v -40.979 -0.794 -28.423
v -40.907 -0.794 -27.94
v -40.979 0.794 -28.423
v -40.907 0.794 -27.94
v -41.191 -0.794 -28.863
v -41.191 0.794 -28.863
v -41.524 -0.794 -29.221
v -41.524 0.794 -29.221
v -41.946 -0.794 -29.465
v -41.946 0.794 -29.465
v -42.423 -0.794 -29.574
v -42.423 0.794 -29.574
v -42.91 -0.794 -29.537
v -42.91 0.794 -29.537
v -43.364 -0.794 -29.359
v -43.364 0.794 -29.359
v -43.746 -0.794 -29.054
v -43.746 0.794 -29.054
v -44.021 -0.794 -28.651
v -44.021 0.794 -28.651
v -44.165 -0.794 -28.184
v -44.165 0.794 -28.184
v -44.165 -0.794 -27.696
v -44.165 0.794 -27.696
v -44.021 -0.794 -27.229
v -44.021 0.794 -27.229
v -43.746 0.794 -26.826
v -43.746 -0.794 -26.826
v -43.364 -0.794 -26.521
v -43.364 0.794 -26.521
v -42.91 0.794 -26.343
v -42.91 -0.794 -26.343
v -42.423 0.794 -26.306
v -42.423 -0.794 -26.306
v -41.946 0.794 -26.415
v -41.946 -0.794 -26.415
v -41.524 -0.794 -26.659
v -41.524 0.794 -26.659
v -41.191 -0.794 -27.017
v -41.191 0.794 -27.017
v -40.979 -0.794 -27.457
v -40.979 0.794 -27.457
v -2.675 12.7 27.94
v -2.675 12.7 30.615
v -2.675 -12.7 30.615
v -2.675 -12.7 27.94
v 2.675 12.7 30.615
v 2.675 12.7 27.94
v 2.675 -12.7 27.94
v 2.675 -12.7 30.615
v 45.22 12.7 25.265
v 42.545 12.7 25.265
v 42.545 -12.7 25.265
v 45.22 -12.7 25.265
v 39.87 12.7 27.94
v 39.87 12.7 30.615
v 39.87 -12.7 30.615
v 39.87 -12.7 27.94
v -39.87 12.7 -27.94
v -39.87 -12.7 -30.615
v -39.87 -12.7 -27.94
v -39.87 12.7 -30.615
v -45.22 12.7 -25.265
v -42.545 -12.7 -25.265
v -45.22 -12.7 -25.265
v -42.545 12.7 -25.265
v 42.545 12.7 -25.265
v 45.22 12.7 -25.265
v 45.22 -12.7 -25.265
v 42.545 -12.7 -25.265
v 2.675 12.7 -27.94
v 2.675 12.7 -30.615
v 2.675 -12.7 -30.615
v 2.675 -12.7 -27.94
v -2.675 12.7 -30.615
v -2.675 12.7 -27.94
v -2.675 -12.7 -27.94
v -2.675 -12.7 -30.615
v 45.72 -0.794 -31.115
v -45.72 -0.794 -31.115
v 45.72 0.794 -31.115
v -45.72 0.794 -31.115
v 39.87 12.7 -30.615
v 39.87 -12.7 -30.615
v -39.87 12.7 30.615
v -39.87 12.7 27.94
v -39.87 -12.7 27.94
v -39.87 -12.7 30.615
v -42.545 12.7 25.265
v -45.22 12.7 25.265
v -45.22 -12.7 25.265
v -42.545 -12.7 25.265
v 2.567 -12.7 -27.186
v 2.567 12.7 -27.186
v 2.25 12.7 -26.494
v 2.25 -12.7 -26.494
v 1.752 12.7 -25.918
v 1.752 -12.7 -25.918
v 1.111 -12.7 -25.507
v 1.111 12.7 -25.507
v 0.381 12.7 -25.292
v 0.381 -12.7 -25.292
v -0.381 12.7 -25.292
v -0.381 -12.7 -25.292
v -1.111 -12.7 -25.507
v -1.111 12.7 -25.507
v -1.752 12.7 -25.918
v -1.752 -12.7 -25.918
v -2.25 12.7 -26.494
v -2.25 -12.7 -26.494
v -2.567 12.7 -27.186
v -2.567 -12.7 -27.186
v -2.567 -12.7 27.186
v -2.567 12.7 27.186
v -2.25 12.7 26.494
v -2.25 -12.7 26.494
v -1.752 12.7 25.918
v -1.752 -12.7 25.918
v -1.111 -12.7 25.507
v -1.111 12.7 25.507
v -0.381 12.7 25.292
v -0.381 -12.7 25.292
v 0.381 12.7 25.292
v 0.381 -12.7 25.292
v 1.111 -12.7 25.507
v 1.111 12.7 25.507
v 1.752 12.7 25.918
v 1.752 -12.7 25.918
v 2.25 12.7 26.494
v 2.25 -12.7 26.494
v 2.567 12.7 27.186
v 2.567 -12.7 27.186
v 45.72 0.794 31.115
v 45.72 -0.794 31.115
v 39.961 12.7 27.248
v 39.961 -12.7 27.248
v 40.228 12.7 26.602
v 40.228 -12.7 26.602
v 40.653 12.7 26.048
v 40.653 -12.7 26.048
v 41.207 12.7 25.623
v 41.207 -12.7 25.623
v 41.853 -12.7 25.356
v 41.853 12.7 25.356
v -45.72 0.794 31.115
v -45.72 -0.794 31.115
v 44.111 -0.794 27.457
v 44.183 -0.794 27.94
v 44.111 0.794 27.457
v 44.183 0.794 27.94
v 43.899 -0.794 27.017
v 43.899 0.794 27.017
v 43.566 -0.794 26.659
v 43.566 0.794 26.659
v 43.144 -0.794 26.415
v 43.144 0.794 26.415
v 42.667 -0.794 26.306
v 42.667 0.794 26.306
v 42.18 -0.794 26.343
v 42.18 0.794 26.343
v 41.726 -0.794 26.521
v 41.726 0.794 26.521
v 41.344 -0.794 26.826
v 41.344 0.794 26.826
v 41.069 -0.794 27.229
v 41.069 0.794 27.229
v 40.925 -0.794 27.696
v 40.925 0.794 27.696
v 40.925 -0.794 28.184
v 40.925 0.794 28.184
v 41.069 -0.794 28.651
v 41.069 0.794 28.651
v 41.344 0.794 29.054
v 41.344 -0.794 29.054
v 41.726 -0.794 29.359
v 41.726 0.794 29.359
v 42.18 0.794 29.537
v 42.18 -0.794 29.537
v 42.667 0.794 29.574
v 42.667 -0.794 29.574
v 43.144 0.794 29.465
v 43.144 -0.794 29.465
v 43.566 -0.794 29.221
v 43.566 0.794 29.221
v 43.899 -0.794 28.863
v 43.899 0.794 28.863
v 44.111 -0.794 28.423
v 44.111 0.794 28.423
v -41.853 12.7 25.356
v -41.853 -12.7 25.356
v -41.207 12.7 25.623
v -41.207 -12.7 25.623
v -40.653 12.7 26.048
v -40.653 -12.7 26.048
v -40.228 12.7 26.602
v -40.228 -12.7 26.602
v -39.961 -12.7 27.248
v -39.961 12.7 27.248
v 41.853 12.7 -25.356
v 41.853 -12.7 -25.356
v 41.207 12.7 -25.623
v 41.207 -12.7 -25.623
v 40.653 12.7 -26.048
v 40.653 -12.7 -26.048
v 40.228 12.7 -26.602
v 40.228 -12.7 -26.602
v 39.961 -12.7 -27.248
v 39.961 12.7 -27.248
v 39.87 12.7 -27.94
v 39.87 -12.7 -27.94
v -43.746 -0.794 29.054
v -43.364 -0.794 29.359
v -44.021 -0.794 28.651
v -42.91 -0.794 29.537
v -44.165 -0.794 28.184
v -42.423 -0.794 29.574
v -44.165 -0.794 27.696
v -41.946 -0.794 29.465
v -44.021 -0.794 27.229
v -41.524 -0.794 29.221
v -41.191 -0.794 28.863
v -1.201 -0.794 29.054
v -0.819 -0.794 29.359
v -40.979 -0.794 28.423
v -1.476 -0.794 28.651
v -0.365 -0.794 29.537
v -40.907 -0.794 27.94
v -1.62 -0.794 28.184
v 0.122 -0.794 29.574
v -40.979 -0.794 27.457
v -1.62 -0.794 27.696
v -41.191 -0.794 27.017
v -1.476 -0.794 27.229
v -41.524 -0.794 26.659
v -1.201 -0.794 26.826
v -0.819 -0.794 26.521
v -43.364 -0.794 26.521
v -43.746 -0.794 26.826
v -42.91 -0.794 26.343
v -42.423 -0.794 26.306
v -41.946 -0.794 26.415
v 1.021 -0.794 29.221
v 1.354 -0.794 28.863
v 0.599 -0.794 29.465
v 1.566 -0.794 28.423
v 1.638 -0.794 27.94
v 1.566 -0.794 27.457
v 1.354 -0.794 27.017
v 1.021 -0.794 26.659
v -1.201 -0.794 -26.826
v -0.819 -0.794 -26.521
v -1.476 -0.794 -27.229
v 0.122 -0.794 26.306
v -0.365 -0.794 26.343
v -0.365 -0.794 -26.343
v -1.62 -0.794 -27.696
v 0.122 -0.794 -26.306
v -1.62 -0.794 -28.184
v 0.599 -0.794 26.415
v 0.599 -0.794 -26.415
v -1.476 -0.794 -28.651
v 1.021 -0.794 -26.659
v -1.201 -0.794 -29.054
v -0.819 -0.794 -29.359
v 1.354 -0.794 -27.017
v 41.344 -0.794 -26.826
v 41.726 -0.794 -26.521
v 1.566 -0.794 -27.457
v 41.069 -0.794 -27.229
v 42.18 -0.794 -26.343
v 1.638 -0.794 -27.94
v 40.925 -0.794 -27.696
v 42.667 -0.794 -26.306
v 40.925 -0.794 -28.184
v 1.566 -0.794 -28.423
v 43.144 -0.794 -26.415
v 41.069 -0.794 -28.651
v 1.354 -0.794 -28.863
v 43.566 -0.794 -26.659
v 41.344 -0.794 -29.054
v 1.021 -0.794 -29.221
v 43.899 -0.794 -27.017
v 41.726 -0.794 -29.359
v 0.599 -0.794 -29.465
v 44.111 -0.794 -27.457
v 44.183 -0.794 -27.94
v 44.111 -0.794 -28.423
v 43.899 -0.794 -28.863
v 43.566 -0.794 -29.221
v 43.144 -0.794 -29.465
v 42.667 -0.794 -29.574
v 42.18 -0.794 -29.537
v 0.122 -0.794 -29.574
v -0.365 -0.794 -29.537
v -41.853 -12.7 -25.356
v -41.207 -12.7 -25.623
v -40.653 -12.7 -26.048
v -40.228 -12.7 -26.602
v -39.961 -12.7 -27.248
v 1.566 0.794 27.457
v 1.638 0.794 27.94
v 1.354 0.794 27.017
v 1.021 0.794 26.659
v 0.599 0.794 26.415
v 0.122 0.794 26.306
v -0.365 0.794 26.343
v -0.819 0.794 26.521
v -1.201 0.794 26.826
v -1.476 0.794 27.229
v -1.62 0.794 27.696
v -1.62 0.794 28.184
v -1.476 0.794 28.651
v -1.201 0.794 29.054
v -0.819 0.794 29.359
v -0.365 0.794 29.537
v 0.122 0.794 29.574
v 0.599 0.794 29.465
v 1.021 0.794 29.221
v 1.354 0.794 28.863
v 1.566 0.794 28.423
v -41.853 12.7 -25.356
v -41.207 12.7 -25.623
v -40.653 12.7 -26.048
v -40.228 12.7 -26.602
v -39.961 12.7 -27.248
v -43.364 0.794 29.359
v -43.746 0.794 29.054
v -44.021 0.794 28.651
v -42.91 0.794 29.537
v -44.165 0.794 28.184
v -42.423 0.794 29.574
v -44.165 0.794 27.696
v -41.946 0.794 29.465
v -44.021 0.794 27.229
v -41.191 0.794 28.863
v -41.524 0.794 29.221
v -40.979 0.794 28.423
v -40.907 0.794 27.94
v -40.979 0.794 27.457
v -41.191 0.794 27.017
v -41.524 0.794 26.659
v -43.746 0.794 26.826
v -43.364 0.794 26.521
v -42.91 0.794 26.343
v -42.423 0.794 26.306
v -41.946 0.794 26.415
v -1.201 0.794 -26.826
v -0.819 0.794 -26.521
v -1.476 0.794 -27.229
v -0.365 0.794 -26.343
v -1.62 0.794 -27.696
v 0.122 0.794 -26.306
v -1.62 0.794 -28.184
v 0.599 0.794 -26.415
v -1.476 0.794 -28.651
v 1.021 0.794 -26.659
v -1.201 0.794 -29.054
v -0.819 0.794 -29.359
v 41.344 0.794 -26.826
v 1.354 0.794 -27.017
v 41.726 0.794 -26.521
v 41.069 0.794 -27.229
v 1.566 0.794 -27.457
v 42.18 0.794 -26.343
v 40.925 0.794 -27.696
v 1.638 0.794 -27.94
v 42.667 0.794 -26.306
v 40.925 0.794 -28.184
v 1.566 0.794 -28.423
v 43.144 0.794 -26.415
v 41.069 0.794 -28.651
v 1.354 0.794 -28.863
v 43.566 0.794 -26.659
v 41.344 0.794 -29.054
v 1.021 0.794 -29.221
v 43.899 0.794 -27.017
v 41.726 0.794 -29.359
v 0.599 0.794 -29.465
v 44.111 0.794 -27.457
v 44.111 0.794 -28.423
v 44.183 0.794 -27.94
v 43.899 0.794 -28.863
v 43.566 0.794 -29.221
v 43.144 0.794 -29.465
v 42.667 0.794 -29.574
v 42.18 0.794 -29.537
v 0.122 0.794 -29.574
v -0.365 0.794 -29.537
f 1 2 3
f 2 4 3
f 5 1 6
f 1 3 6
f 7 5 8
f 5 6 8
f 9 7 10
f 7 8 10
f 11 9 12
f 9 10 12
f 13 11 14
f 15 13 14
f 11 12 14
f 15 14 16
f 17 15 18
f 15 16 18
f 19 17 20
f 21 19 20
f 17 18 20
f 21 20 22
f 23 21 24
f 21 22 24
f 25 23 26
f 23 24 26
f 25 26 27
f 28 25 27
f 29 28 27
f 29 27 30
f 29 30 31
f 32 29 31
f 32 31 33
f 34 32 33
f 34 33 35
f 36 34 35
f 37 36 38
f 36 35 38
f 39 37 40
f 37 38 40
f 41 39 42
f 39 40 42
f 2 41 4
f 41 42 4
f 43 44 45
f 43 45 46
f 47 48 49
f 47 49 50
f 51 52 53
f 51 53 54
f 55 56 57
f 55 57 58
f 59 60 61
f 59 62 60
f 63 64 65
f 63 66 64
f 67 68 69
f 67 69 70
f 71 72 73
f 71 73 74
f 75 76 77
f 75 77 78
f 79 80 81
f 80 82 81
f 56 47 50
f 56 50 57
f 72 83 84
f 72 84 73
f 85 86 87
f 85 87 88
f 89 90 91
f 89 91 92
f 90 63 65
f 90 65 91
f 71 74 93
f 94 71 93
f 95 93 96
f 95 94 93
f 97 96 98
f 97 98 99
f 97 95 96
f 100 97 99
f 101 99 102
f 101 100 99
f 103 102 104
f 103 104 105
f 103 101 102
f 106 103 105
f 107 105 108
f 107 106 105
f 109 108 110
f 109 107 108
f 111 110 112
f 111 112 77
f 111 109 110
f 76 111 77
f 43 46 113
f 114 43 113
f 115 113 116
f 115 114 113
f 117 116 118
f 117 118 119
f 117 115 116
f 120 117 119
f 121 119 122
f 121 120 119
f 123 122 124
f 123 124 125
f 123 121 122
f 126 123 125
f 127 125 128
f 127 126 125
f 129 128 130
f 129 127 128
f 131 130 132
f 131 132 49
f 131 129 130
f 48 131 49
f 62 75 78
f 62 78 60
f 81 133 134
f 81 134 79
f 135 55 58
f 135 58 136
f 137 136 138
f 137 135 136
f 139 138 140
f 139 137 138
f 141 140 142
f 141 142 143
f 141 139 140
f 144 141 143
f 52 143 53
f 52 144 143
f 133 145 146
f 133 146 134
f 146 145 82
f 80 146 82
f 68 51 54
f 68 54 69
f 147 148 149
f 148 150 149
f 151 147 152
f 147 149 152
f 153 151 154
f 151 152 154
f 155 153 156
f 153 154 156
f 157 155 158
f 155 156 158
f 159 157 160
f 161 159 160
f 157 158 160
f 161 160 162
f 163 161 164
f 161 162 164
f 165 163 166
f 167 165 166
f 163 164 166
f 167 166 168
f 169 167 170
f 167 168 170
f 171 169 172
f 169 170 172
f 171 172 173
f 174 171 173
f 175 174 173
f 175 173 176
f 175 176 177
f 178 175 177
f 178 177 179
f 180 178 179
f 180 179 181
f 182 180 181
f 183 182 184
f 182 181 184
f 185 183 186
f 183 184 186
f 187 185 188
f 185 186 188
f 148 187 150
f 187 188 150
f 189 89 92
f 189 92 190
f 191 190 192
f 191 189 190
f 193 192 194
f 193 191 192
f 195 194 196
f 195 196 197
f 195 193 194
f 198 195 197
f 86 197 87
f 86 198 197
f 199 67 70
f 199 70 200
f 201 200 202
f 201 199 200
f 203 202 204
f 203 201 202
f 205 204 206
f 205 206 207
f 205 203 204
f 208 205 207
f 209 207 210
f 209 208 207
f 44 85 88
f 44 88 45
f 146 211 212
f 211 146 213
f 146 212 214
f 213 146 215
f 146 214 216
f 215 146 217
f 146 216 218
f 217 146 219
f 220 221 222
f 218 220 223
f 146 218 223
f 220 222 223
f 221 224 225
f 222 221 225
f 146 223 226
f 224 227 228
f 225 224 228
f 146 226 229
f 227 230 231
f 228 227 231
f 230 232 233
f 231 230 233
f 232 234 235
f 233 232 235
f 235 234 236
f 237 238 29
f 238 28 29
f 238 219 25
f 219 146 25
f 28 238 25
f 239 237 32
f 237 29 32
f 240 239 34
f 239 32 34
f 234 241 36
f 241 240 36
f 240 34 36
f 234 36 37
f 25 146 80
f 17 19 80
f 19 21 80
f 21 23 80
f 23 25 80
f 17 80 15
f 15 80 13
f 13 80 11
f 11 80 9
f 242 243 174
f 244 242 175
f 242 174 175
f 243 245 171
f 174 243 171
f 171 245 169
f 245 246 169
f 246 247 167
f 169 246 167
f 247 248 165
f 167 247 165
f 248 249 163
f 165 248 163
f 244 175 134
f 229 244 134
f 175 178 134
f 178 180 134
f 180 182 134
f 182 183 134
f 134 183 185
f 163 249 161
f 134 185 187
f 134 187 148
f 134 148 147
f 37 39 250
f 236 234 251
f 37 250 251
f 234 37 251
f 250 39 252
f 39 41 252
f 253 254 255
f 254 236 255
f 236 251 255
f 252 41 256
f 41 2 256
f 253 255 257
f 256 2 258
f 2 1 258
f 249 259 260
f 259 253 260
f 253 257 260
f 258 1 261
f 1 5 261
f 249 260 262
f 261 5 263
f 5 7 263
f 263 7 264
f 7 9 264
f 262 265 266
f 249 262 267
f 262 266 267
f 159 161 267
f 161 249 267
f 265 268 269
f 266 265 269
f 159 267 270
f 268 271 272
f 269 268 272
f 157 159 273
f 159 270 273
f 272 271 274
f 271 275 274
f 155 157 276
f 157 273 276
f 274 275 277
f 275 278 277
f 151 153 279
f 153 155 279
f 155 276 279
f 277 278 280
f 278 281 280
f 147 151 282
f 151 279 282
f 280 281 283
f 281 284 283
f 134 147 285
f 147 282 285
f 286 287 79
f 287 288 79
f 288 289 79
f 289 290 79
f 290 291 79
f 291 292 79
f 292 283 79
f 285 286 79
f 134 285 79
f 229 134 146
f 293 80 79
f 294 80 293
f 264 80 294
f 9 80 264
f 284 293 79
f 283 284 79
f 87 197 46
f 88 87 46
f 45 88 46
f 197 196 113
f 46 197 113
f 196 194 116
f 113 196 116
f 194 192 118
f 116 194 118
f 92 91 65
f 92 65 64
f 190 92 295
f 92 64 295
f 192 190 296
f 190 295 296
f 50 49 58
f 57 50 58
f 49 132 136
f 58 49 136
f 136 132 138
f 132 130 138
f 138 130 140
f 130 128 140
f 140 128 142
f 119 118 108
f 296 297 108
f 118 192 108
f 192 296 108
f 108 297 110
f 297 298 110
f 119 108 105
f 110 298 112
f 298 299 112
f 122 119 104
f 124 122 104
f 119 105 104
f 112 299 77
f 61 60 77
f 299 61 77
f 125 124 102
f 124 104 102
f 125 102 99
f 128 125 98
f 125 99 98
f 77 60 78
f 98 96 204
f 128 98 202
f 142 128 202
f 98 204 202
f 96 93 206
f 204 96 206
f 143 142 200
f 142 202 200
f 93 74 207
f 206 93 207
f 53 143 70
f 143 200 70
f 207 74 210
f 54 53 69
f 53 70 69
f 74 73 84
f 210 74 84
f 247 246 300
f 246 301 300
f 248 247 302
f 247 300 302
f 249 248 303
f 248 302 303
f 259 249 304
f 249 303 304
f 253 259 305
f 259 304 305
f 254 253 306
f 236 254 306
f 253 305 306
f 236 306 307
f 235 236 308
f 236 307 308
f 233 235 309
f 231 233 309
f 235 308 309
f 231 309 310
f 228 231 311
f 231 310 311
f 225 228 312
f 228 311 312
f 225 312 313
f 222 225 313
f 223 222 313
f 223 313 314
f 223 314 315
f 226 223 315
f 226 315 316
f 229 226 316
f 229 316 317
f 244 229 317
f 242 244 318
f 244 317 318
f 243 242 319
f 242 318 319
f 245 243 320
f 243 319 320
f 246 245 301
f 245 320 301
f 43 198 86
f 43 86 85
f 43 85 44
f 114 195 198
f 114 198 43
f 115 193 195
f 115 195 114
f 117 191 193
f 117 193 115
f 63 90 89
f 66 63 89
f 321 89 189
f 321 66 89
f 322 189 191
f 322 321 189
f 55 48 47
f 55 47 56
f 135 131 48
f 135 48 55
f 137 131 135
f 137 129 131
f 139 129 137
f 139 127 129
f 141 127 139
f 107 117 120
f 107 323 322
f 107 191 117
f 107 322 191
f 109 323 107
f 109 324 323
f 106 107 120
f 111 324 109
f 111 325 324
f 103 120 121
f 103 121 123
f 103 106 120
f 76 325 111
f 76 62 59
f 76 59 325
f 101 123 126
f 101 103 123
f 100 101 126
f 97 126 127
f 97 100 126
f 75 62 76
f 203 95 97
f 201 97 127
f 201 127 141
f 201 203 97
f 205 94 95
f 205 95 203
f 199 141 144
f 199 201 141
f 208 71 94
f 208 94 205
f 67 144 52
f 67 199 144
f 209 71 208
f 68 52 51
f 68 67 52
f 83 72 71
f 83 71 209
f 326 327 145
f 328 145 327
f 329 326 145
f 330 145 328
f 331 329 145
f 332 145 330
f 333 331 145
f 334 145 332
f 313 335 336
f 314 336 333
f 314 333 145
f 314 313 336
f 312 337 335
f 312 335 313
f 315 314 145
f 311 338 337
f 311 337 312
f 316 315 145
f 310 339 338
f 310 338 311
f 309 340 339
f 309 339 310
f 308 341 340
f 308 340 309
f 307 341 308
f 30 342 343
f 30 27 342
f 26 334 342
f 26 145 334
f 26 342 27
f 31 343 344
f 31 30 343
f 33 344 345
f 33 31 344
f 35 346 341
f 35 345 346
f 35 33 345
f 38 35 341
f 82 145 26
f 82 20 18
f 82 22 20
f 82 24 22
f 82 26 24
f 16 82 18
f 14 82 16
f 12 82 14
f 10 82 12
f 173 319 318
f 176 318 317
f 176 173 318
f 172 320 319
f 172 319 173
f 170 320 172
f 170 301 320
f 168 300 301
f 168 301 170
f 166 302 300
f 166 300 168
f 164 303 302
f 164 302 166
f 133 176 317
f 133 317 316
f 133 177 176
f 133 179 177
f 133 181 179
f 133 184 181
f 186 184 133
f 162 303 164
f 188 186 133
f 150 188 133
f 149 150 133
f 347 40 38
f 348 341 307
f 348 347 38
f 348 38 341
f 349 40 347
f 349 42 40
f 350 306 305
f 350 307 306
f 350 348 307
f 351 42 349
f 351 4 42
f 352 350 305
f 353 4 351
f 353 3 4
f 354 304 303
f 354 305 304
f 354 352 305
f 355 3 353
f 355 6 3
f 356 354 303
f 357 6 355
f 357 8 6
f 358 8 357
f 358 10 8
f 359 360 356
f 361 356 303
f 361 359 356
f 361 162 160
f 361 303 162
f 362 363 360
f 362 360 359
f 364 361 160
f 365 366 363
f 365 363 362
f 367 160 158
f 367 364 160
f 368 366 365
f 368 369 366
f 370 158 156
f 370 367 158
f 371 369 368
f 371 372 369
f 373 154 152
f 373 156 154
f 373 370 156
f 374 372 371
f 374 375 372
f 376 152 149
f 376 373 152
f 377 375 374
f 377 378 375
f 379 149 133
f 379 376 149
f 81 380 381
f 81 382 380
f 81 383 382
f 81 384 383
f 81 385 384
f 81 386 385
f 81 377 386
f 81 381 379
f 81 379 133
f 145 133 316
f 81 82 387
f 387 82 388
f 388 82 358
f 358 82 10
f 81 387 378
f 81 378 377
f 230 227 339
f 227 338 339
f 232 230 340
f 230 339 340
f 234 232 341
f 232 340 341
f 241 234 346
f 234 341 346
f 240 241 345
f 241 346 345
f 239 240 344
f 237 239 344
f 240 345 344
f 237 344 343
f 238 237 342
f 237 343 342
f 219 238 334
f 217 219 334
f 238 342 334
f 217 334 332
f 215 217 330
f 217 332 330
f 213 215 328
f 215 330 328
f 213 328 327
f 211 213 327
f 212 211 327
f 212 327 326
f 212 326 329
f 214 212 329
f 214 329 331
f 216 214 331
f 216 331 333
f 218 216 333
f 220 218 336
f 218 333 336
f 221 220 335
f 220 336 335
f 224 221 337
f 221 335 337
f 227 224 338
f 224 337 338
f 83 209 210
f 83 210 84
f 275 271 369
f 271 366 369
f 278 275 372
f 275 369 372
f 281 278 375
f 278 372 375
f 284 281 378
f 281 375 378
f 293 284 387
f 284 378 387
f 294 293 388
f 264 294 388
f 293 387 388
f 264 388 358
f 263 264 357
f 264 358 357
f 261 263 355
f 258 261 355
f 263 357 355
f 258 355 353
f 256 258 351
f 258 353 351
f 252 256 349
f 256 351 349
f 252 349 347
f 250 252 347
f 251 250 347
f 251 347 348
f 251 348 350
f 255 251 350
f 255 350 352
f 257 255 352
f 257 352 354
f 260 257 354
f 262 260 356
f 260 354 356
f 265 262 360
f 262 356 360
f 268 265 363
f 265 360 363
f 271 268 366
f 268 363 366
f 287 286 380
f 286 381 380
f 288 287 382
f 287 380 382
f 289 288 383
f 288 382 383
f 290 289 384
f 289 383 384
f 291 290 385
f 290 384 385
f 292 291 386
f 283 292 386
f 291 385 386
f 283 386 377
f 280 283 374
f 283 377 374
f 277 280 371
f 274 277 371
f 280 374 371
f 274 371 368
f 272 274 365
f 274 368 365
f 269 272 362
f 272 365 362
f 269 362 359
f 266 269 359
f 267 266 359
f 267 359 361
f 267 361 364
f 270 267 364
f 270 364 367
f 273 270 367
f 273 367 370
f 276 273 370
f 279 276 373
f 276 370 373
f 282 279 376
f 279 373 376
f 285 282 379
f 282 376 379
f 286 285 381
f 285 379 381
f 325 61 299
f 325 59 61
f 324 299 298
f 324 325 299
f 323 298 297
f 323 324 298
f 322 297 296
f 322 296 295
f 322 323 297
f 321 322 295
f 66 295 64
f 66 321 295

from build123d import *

# Parameters (mm, degrees)
SKETCH1_W            = 91.44
SKETCH1_H            = 62.23
BOSS_EXTRUDE1_DEPTH  = 0.79375
SKETCH3_R            = 1.6383
CUT_EXTRUDE1_DEPTH   = 1.79375
LPATTERN1_COUNT      = 3
LPATTERN1_PITCH      = 42.545
LPATTERN1_COUNT_DIR2 = 2
LPATTERN1_PITCH_DIR2 = 55.88
BOSS_EXTRUDE2_DEPTH  = 12.7


with BuildPart() as part:
    # Sketch1 → Boss-Extrude1 (new body, symmetric)
    with BuildSketch(Plane(origin=(0, 0, 0), x_dir=(1, 0, 0), z_dir=(0, 1, 0))):
        Rectangle(SKETCH1_W, SKETCH1_H)
    extrude(amount=BOSS_EXTRUDE1_DEPTH, both=True)

    # Sketch3 → Cut-Extrude1 (cut, symmetric)
    with BuildSketch(Plane(origin=(0, 0, 0), x_dir=(1, 0, 0), z_dir=(0, 1, 0))):
        with Locations((-42.545, 27.94)):
            Circle(SKETCH3_R)
    cut_extrude1 = extrude(amount=CUT_EXTRUDE1_DEPTH, both=True, mode=Mode.SUBTRACT)

    # LPattern1: Cut-Extrude1 3 × 2
    with Locations(*[(i * LPATTERN1_PITCH, 0, j * LPATTERN1_PITCH_DIR2) for i in range(LPATTERN1_COUNT) for j in range(LPATTERN1_COUNT_DIR2) if (i, j) != (0, 0)]):
        add(cut_extrude1, mode=Mode.SUBTRACT)


with BuildPart() as body_2:
    # Sketch2 → Boss-Extrude2 (new body, symmetric)
    with BuildSketch(Plane(origin=(0, 0, 0), x_dir=(1, 0, 0), z_dir=(0, 1, 0))):
        with BuildLine():
            Line((-42.545, 25.265), (-45.22, 25.265))
            Line((-45.22, 25.265), (-45.22, -25.265))
            Line((-45.22, -25.265), (-42.545, -25.265))
            ThreePointArc((-42.545, -25.265), (-40.65348936, -26.04848936), (-39.87, -27.94))
            Line((-39.87, -27.94), (-39.87, -30.615))
            Line((-39.87, -30.615), (-2.675, -30.615))
            Line((-2.675, -30.615), (-2.675, -27.94))
            ThreePointArc((-2.675, -27.94), (0, -25.265), (2.675, -27.94))
            Line((2.675, -27.94), (2.675, -30.615))
            Line((2.675, -30.615), (39.87, -30.615))
            Line((39.87, -30.615), (39.87, -27.94))
            ThreePointArc((39.87, -27.94), (40.65348936, -26.04848936), (42.545, -25.265))
            Line((42.545, -25.265), (45.22, -25.265))
            Line((45.22, -25.265), (45.22, 25.265))
            Line((45.22, 25.265), (42.545, 25.265))
            ThreePointArc((42.545, 25.265), (40.65348936, 26.04848936), (39.87, 27.94))
            Line((39.87, 27.94), (39.87, 30.615))
            Line((39.87, 30.615), (2.675, 30.615))
            Line((2.675, 30.615), (2.675, 27.94))
            ThreePointArc((2.675, 27.94), (0, 25.265), (-2.675, 27.94))
            Line((-2.675, 27.94), (-2.675, 30.615))
            Line((-2.675, 30.615), (-39.87, 30.615))
            Line((-39.87, 30.615), (-39.87, 27.94))
            ThreePointArc((-39.87, 27.94), (-40.65348936, 26.04848936), (-42.545, 25.265))
        make_face()
    extrude(amount=BOSS_EXTRUDE2_DEPTH, both=True)


solid = Compound([part.part, body_2.part])
